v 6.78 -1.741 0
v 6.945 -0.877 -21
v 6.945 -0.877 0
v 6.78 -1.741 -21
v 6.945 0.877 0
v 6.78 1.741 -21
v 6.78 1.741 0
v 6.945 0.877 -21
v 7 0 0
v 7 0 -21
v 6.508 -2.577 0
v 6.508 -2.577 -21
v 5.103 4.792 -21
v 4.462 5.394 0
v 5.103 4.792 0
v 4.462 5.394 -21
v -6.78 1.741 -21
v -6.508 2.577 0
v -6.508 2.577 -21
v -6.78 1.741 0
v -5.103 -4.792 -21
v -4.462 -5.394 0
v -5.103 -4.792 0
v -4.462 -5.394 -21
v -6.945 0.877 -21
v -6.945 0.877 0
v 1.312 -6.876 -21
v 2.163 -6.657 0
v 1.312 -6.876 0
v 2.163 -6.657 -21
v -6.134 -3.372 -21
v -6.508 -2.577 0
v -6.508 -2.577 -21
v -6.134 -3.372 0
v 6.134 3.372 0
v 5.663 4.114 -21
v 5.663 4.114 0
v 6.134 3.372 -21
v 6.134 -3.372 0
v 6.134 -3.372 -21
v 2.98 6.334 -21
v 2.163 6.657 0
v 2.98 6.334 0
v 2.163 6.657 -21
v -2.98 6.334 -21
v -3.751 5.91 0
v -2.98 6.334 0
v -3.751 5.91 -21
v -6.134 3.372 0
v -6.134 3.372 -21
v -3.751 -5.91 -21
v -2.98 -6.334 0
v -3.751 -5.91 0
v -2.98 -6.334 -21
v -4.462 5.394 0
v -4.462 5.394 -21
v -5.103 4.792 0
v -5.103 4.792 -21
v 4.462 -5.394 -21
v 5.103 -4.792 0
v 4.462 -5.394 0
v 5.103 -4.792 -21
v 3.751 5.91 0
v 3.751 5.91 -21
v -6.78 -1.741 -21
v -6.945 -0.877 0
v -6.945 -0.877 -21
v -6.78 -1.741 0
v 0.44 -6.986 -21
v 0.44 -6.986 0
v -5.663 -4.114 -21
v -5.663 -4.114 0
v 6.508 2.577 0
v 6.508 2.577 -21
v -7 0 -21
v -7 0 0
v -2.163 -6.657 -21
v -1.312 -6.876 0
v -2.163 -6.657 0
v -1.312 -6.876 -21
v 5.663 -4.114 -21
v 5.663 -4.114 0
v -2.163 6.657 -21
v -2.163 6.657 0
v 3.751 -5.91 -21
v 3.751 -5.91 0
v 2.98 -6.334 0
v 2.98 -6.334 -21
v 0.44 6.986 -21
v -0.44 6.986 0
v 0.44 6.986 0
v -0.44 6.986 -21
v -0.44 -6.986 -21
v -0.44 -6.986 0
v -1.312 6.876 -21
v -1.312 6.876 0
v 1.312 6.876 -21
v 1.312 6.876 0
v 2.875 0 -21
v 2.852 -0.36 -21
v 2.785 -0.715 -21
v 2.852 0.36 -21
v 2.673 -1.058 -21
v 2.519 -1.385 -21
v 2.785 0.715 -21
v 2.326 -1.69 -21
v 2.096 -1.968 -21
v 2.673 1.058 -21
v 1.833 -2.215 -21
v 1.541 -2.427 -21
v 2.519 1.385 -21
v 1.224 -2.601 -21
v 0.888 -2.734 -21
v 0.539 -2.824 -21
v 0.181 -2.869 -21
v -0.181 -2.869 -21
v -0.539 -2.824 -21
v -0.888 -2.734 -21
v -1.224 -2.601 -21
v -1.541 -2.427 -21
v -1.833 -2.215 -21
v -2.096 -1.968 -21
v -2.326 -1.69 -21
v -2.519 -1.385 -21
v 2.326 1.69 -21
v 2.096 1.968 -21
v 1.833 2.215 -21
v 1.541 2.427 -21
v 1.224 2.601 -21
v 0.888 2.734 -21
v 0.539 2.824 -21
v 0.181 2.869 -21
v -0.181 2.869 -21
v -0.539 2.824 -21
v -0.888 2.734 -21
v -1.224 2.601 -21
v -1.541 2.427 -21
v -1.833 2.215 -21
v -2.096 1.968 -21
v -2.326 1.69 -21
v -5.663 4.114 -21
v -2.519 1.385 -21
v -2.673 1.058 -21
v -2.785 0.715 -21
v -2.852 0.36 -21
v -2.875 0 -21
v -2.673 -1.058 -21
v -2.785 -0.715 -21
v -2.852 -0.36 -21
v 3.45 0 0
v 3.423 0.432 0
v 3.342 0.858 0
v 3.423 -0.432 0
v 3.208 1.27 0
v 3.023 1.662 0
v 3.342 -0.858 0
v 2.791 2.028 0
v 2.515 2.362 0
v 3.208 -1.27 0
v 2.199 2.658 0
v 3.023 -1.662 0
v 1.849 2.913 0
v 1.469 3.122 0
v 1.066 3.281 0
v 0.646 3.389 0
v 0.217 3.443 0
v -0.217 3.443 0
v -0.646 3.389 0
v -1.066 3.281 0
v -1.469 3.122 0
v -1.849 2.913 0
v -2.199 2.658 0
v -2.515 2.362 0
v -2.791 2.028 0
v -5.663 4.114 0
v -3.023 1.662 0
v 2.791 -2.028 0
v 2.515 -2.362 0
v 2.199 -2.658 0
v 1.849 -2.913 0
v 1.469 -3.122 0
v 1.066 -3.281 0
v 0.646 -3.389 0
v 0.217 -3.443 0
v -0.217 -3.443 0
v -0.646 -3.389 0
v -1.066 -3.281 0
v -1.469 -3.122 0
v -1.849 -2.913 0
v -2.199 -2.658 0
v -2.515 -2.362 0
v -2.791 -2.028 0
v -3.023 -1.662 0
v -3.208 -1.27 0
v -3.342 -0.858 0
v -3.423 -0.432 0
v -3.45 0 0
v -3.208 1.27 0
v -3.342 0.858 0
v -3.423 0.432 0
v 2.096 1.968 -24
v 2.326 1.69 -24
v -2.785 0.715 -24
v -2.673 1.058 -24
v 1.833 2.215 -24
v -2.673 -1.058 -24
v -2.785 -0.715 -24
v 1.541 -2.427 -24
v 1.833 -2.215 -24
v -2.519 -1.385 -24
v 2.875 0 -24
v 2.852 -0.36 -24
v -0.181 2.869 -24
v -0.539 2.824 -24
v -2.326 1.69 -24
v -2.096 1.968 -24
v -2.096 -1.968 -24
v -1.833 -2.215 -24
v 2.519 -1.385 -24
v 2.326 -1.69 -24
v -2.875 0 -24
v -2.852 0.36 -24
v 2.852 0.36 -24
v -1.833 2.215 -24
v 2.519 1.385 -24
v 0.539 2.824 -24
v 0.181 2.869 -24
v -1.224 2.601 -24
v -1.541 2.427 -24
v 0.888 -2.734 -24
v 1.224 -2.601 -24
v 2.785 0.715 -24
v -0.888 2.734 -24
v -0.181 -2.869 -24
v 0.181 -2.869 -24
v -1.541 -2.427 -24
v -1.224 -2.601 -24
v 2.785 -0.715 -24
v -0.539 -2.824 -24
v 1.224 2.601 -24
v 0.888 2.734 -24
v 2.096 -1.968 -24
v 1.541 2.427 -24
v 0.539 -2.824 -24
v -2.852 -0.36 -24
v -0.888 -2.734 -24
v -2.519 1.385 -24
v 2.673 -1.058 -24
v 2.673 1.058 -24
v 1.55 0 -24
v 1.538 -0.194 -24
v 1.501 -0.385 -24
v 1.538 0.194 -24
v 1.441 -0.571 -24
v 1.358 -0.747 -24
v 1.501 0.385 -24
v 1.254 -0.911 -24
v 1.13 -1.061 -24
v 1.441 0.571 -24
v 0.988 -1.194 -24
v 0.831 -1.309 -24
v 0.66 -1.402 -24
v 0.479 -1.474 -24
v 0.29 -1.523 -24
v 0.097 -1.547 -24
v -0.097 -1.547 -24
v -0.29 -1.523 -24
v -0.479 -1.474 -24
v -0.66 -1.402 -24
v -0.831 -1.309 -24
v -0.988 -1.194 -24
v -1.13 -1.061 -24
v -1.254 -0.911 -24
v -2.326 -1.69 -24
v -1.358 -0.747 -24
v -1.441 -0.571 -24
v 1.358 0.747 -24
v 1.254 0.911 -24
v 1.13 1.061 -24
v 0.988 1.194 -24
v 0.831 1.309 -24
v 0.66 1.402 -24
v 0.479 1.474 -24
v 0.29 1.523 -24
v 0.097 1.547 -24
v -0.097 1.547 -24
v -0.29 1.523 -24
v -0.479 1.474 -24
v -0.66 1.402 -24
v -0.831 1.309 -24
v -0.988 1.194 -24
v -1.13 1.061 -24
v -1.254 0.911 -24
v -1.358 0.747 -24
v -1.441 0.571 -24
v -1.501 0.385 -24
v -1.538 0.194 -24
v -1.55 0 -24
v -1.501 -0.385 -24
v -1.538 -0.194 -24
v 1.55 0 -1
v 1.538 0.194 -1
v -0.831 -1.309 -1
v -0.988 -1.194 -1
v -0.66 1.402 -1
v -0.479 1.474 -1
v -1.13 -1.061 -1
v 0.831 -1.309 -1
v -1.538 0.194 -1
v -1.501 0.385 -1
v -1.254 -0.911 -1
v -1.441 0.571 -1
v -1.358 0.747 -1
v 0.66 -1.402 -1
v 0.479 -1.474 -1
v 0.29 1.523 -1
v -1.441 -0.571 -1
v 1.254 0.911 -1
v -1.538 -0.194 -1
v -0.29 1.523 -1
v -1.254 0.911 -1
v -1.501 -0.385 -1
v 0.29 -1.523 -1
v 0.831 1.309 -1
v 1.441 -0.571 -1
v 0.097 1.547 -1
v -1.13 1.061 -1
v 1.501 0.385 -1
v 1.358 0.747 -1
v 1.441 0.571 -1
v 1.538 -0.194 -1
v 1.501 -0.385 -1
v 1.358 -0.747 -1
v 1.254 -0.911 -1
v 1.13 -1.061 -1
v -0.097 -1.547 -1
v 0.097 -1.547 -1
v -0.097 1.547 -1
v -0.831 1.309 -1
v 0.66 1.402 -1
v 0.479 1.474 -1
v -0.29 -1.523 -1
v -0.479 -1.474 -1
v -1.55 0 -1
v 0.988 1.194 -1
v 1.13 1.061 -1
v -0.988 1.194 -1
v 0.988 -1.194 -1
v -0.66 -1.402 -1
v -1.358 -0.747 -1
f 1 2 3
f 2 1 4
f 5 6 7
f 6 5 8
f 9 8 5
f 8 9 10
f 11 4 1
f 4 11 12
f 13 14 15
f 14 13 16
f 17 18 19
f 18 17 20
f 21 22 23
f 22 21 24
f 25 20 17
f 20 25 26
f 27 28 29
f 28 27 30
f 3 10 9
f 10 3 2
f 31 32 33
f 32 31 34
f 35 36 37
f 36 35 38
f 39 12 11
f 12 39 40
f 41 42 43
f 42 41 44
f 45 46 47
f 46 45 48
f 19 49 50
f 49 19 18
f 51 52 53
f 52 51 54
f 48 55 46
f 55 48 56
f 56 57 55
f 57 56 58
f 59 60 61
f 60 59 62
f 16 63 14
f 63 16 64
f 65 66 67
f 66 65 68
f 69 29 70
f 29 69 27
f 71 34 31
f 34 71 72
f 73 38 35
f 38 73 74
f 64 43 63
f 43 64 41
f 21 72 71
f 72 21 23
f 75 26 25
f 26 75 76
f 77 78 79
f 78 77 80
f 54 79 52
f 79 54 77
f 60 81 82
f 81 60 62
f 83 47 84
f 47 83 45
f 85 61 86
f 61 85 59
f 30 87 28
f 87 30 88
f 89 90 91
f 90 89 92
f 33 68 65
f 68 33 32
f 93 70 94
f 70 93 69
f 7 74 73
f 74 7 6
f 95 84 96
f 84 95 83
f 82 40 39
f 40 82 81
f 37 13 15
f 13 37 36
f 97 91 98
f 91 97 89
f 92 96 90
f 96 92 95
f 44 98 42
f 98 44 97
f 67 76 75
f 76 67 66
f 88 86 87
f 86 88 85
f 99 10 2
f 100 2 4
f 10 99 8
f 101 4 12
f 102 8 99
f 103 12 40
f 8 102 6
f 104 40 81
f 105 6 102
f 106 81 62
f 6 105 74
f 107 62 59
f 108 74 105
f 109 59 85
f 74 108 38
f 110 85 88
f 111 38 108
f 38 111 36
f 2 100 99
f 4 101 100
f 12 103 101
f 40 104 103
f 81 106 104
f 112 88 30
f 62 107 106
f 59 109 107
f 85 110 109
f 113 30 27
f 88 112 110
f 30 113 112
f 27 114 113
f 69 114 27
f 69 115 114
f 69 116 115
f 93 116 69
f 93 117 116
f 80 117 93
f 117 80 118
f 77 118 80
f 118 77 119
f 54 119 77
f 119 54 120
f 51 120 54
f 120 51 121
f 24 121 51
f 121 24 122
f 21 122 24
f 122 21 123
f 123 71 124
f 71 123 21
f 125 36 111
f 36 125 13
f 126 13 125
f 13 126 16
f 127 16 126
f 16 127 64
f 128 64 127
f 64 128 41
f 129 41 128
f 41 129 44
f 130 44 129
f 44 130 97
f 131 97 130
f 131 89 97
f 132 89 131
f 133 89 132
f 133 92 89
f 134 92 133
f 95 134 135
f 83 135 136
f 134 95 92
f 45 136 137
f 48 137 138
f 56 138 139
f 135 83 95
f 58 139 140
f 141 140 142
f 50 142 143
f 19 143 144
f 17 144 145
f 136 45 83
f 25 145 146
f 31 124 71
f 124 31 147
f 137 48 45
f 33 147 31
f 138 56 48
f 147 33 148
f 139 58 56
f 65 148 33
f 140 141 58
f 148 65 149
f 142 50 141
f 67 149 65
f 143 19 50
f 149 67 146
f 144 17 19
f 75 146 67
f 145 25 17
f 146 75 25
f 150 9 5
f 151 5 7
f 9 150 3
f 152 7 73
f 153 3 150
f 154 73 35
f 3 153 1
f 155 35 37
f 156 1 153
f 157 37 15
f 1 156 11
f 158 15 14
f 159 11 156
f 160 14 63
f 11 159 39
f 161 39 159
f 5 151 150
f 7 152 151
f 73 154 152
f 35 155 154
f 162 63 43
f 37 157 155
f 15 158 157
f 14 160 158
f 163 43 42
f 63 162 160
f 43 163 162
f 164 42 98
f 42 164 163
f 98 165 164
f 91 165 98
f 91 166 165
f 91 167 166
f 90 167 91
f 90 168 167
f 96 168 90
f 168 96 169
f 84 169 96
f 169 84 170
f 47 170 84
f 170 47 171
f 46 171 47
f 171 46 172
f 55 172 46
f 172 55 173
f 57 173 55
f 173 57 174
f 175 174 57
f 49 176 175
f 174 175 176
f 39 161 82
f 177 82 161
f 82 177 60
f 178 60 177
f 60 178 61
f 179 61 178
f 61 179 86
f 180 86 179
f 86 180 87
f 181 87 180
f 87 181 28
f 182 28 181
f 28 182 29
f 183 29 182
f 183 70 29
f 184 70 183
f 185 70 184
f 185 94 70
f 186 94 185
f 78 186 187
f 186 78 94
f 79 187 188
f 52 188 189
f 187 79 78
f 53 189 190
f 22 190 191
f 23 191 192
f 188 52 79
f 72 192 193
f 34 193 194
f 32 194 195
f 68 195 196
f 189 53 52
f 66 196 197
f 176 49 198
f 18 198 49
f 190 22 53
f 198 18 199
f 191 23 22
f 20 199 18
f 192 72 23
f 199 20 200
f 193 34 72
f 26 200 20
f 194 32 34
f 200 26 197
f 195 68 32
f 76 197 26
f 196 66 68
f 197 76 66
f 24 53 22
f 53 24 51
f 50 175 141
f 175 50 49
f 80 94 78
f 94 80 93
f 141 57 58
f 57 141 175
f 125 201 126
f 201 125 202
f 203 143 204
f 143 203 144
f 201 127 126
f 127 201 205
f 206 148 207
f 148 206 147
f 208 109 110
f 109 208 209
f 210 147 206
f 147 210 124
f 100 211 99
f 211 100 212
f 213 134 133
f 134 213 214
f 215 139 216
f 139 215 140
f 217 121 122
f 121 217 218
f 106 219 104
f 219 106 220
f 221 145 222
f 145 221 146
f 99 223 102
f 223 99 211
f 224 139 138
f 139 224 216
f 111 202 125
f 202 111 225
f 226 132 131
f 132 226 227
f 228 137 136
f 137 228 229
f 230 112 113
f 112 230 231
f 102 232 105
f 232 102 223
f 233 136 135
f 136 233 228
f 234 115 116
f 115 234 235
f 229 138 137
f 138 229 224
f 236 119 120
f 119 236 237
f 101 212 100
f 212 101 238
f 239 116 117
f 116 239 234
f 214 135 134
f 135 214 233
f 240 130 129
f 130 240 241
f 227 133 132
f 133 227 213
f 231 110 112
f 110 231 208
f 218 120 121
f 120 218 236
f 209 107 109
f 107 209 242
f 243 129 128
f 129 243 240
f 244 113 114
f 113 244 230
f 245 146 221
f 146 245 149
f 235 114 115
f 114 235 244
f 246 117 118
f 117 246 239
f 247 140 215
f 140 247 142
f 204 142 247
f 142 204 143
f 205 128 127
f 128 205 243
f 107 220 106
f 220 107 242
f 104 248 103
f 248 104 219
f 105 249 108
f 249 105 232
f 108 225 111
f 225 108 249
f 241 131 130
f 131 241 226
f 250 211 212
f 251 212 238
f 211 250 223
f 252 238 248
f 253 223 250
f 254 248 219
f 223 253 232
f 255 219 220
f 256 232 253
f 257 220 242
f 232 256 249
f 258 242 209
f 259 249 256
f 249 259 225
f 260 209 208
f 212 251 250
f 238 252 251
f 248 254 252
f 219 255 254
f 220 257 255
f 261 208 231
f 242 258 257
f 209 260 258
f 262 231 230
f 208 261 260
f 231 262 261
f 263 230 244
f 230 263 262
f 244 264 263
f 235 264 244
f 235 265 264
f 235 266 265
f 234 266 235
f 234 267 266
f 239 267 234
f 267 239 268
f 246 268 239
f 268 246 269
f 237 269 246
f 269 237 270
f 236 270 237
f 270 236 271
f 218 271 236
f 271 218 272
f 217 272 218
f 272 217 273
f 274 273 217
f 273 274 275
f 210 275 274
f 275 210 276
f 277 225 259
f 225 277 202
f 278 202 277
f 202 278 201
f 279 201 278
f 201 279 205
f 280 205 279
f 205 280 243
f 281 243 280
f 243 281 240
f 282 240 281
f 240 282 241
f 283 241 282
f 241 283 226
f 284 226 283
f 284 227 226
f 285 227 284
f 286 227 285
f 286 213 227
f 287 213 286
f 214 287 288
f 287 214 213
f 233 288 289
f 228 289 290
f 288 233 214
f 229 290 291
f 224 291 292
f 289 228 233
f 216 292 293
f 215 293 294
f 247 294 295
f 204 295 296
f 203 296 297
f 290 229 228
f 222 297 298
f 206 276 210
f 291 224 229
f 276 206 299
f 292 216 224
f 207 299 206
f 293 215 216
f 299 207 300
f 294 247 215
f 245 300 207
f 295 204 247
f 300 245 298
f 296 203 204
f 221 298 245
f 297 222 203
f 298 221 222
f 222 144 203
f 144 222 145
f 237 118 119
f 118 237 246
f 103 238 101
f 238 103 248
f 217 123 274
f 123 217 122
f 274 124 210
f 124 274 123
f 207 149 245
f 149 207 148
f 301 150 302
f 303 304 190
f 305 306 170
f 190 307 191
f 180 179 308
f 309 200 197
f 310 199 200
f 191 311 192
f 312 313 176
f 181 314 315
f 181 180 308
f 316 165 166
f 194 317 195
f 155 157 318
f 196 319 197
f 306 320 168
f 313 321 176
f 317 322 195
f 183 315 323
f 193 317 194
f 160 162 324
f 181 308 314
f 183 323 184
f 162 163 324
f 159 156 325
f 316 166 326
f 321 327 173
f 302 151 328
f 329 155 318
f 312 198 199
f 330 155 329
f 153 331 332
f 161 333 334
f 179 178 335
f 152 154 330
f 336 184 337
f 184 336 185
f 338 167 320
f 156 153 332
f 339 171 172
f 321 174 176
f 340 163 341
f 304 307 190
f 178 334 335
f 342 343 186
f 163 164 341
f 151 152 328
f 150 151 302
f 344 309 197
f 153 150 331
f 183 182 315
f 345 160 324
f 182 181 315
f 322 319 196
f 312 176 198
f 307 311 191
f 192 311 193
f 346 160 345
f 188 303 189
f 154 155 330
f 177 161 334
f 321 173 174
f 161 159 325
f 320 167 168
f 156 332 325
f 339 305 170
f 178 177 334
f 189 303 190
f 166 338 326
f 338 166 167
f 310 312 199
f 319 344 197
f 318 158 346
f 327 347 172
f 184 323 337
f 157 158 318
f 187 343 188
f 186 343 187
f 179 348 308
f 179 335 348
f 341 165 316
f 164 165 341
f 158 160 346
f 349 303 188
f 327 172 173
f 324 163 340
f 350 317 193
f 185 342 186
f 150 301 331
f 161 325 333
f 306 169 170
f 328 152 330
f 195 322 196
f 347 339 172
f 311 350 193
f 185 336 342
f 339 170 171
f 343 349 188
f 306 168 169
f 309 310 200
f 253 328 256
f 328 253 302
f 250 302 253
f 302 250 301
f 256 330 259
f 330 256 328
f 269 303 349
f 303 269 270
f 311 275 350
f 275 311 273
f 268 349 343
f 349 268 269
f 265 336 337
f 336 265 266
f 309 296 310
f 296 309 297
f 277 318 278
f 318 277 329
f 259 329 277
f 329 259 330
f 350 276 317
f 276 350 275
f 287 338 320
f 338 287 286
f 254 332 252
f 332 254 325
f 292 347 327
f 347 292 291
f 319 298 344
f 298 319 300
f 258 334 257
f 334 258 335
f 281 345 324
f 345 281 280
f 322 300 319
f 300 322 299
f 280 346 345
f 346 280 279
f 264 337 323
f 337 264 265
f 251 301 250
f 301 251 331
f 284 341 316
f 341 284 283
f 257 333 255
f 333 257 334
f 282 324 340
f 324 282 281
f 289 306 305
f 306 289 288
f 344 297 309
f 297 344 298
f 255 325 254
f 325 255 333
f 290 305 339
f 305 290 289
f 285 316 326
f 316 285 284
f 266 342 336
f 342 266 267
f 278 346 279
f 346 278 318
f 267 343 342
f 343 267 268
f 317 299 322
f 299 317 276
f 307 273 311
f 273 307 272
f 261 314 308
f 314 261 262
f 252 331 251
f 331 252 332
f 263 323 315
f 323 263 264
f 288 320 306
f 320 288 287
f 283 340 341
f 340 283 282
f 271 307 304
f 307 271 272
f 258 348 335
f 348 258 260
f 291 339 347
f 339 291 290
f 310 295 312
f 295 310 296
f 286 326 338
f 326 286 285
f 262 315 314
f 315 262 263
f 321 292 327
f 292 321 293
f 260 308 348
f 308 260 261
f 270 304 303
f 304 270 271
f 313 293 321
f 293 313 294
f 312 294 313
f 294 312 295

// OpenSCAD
$fn = 50;

difference() {
	union() {
		translate(v = [0, 0, -21.0]) {
			cylinder(h = 21, r = 7.0);
		}
		#translate(v = [0, 0, -24.0]) {
			cylinder(h = 24, r = 2.875);
		}
	}
	union() {
		translate(v = [0, 0, 0]) {
			rotate(a = [0, 0, 0]) {
				difference() {
					union() {
						translate(v = [0, 0, -24.0]) {
							cylinder(h = 24, r = 1.25);
						}
						translate(v = [0, 0, -1.0]) {
							cylinder(h = 1.0, r1 = 1.55, r2 = 3.45);
						}
						translate(v = [0, 0, -24.0]) {
							cylinder(h = 24, r = 1.55);
						}
						translate(v = [0, 0, -24.0]) {
							cylinder(h = 24, r = 1.25);
						}
					}
					union();
				}
			}
		}
	}
}
